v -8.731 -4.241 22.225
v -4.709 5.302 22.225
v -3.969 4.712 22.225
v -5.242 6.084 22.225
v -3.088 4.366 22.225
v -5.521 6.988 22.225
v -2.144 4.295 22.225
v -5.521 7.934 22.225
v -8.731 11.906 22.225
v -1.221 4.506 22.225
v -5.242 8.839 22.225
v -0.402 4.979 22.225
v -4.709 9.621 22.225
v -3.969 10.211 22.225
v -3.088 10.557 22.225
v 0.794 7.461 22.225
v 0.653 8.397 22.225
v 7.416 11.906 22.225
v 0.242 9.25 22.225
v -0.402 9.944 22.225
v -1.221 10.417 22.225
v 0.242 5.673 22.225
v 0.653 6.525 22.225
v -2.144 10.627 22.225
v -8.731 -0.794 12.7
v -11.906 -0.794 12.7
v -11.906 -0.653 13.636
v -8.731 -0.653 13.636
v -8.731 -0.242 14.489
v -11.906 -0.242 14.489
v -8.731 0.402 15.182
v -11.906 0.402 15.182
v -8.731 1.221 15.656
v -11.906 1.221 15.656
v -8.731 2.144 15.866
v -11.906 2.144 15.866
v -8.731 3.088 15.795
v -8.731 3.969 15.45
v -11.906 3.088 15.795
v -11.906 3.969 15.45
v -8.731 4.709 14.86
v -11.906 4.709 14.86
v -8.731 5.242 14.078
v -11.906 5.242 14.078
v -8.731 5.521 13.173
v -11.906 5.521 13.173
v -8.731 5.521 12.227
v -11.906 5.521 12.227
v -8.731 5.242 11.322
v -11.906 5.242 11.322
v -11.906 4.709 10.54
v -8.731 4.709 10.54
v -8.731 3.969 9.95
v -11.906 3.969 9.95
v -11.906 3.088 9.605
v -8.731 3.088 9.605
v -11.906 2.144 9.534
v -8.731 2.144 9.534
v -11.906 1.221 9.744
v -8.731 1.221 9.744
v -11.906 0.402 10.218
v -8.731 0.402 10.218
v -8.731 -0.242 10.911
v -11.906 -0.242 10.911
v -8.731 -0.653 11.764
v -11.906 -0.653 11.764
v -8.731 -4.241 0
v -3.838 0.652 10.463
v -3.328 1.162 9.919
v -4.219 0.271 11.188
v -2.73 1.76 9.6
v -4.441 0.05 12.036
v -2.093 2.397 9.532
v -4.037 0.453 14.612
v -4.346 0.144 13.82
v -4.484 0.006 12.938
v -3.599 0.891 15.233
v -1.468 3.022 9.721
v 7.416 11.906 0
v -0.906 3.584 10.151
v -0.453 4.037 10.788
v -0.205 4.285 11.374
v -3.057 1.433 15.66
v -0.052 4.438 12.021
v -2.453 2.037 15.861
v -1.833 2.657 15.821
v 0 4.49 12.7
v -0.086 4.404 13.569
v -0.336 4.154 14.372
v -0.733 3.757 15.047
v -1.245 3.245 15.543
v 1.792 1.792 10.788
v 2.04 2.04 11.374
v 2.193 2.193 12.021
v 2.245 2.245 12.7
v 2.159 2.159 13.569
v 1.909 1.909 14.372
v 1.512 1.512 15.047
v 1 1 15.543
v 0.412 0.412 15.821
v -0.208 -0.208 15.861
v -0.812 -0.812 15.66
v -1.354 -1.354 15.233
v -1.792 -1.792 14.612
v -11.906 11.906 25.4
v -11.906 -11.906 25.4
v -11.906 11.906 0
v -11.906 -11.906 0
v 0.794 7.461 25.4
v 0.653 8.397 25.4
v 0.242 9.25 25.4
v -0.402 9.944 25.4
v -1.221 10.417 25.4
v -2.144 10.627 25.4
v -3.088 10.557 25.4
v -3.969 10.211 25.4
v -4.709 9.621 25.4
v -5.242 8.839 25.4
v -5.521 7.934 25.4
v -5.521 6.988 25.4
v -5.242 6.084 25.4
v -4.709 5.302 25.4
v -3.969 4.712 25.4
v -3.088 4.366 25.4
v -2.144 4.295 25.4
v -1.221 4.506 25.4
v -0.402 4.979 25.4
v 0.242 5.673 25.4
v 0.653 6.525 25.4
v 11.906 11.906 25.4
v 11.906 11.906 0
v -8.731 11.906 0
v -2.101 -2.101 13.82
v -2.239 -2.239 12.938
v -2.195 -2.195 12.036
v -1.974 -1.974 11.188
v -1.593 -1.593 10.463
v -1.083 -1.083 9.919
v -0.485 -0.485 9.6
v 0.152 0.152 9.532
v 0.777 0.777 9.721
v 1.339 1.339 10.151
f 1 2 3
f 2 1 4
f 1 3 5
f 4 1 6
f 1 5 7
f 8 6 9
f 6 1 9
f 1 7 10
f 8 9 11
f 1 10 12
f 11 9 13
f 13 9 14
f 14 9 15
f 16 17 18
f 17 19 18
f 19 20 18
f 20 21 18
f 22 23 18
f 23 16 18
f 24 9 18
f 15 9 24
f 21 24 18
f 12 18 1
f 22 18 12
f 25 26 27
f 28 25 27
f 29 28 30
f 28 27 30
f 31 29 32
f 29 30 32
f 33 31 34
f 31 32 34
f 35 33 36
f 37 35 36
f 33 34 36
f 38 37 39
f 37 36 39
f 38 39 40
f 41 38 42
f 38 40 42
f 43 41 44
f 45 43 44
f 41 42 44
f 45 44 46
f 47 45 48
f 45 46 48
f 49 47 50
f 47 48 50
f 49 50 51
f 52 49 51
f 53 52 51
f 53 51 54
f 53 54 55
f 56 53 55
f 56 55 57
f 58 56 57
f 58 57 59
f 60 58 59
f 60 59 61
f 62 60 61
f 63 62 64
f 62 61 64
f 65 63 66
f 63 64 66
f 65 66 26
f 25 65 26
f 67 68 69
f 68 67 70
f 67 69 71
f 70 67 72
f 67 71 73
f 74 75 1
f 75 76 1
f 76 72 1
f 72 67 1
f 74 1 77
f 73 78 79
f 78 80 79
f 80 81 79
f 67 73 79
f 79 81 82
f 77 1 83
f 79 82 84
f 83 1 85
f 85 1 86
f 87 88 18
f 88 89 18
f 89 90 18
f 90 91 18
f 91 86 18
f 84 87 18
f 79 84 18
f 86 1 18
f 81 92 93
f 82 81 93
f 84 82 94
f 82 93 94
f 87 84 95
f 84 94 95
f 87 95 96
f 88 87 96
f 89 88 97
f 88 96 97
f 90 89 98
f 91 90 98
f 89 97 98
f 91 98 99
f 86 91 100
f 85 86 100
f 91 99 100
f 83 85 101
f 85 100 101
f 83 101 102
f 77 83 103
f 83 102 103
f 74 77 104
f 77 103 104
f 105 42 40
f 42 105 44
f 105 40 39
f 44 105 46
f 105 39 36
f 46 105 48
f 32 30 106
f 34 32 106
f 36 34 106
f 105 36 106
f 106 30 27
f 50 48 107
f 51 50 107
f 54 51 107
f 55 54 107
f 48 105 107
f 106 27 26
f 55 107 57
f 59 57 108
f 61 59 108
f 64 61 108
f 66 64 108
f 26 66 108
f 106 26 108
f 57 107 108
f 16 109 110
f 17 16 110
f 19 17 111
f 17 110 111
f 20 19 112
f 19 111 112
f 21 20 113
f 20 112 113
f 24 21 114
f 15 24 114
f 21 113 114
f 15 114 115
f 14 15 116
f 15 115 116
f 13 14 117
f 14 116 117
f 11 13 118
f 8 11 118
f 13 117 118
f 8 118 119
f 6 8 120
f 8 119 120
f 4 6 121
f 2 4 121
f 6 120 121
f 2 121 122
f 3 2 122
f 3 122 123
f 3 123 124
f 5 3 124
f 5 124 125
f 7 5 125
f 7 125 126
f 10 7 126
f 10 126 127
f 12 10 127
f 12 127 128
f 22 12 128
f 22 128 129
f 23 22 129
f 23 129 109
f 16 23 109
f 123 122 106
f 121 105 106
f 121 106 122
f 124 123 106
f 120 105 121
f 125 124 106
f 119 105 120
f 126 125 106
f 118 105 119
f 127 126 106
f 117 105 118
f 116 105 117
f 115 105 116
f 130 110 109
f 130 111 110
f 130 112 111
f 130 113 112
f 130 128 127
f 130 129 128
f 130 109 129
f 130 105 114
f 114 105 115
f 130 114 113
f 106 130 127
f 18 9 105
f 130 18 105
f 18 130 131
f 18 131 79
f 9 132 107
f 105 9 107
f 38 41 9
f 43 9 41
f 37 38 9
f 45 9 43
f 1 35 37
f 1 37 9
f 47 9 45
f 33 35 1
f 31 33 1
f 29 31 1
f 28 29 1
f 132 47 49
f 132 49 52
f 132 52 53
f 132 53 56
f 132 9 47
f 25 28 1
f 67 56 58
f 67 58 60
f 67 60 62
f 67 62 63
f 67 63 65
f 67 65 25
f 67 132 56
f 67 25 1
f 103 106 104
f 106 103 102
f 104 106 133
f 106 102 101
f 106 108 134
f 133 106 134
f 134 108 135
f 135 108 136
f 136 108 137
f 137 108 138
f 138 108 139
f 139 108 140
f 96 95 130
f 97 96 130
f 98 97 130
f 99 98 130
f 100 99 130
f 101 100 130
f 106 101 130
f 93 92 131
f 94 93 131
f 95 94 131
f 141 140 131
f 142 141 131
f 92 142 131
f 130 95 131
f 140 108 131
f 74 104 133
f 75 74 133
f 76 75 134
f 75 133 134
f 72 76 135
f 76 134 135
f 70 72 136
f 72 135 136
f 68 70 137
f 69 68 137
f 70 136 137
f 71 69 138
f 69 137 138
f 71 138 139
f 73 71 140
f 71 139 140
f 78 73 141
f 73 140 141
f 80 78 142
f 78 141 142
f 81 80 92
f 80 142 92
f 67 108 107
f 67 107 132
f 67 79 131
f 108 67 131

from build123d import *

# Parameters (mm, degrees)
F1_DEPTH = 25.4
F2_T     = -3.175
F3_DEPTH = 25.4
F4_R     = 3.175
F5_DEPTH = 3.175
F6_R     = 3.175
F7_DEPTH = 25.4
F9_DEPTH = 3.175


# Not quite as in the source:
# - a feature names something its author has since deleted; it is built from what else it names


with BuildPart() as f1:
    # F0 (on Top) → F1 (new body)
    with BuildSketch(Plane.XY):
        Polygon((11.90625, 11.90625), (-11.90625, 11.90625), (-11.90625, -11.90625), align=None)
    extrude(amount=F1_DEPTH)

    # F2
    f2_openings = [f1.faces().sort_by_distance(p)[0] for p in [
        (0, 11.90625, 12.7),
    ]]
    offset(amount=F2_T, openings=f2_openings)

    # F3 (cut): a face of the model
    f3_faces = [f1.faces().sort_by_distance(p)[0] for p in [
        (-3.3487926868, 6.5237926868, 3.175),
    ]]
    extrude(f3_faces, amount=-F3_DEPTH, mode=Mode.SUBTRACT)

    # F4 (on face) → F5 (cut)
    with BuildSketch(Plane(origin=(-11.90625, 0, 0), x_dir=(0, -1, 0), z_dir=(-1, 0, 0))):
        with Locations((-2.38125, 12.7)):
            Circle(F4_R)
    extrude(amount=-F5_DEPTH, mode=Mode.SUBTRACT)

    # F6 (on face) → F7 (cut)
    with BuildSketch(Plane.XY.offset(25.4)):
        with Locations((-2.38125, 7.46125)):
            Circle(F6_R)
    extrude(amount=-F7_DEPTH, mode=Mode.SUBTRACT)

    # F8 (on face) → F9 (cut)
    with BuildSketch(Plane(origin=(0, 0, 0), x_dir=(0.7071067812, 0.7071067812, 0), z_dir=(0.7071067812, -0.7071067812, 0))):
        with BuildLine():
            ThreePointArc((3.175, 12.7), (1.0081076412, 15.7107048982), (-2.5348229819, 14.6118832209))
            Line((-2.5348229819, 14.6118832209), (2.5348229819, 10.7881167791))
            ThreePointArc((2.5348229819, 10.7881167791), (3.0107048982, 11.6918923588), (3.175, 12.7))
        make_face()
        with BuildLine():
            Line((2.5348229819, 10.7881167791), (-2.5348229819, 14.6118832209))
            ThreePointArc((-2.5348229819, 14.6118832209), (-1.9118832209, 10.1651770181), (2.5348229819, 10.7881167791))
        make_face()
    extrude(amount=-F9_DEPTH, mode=Mode.SUBTRACT)


solid = f1.part
